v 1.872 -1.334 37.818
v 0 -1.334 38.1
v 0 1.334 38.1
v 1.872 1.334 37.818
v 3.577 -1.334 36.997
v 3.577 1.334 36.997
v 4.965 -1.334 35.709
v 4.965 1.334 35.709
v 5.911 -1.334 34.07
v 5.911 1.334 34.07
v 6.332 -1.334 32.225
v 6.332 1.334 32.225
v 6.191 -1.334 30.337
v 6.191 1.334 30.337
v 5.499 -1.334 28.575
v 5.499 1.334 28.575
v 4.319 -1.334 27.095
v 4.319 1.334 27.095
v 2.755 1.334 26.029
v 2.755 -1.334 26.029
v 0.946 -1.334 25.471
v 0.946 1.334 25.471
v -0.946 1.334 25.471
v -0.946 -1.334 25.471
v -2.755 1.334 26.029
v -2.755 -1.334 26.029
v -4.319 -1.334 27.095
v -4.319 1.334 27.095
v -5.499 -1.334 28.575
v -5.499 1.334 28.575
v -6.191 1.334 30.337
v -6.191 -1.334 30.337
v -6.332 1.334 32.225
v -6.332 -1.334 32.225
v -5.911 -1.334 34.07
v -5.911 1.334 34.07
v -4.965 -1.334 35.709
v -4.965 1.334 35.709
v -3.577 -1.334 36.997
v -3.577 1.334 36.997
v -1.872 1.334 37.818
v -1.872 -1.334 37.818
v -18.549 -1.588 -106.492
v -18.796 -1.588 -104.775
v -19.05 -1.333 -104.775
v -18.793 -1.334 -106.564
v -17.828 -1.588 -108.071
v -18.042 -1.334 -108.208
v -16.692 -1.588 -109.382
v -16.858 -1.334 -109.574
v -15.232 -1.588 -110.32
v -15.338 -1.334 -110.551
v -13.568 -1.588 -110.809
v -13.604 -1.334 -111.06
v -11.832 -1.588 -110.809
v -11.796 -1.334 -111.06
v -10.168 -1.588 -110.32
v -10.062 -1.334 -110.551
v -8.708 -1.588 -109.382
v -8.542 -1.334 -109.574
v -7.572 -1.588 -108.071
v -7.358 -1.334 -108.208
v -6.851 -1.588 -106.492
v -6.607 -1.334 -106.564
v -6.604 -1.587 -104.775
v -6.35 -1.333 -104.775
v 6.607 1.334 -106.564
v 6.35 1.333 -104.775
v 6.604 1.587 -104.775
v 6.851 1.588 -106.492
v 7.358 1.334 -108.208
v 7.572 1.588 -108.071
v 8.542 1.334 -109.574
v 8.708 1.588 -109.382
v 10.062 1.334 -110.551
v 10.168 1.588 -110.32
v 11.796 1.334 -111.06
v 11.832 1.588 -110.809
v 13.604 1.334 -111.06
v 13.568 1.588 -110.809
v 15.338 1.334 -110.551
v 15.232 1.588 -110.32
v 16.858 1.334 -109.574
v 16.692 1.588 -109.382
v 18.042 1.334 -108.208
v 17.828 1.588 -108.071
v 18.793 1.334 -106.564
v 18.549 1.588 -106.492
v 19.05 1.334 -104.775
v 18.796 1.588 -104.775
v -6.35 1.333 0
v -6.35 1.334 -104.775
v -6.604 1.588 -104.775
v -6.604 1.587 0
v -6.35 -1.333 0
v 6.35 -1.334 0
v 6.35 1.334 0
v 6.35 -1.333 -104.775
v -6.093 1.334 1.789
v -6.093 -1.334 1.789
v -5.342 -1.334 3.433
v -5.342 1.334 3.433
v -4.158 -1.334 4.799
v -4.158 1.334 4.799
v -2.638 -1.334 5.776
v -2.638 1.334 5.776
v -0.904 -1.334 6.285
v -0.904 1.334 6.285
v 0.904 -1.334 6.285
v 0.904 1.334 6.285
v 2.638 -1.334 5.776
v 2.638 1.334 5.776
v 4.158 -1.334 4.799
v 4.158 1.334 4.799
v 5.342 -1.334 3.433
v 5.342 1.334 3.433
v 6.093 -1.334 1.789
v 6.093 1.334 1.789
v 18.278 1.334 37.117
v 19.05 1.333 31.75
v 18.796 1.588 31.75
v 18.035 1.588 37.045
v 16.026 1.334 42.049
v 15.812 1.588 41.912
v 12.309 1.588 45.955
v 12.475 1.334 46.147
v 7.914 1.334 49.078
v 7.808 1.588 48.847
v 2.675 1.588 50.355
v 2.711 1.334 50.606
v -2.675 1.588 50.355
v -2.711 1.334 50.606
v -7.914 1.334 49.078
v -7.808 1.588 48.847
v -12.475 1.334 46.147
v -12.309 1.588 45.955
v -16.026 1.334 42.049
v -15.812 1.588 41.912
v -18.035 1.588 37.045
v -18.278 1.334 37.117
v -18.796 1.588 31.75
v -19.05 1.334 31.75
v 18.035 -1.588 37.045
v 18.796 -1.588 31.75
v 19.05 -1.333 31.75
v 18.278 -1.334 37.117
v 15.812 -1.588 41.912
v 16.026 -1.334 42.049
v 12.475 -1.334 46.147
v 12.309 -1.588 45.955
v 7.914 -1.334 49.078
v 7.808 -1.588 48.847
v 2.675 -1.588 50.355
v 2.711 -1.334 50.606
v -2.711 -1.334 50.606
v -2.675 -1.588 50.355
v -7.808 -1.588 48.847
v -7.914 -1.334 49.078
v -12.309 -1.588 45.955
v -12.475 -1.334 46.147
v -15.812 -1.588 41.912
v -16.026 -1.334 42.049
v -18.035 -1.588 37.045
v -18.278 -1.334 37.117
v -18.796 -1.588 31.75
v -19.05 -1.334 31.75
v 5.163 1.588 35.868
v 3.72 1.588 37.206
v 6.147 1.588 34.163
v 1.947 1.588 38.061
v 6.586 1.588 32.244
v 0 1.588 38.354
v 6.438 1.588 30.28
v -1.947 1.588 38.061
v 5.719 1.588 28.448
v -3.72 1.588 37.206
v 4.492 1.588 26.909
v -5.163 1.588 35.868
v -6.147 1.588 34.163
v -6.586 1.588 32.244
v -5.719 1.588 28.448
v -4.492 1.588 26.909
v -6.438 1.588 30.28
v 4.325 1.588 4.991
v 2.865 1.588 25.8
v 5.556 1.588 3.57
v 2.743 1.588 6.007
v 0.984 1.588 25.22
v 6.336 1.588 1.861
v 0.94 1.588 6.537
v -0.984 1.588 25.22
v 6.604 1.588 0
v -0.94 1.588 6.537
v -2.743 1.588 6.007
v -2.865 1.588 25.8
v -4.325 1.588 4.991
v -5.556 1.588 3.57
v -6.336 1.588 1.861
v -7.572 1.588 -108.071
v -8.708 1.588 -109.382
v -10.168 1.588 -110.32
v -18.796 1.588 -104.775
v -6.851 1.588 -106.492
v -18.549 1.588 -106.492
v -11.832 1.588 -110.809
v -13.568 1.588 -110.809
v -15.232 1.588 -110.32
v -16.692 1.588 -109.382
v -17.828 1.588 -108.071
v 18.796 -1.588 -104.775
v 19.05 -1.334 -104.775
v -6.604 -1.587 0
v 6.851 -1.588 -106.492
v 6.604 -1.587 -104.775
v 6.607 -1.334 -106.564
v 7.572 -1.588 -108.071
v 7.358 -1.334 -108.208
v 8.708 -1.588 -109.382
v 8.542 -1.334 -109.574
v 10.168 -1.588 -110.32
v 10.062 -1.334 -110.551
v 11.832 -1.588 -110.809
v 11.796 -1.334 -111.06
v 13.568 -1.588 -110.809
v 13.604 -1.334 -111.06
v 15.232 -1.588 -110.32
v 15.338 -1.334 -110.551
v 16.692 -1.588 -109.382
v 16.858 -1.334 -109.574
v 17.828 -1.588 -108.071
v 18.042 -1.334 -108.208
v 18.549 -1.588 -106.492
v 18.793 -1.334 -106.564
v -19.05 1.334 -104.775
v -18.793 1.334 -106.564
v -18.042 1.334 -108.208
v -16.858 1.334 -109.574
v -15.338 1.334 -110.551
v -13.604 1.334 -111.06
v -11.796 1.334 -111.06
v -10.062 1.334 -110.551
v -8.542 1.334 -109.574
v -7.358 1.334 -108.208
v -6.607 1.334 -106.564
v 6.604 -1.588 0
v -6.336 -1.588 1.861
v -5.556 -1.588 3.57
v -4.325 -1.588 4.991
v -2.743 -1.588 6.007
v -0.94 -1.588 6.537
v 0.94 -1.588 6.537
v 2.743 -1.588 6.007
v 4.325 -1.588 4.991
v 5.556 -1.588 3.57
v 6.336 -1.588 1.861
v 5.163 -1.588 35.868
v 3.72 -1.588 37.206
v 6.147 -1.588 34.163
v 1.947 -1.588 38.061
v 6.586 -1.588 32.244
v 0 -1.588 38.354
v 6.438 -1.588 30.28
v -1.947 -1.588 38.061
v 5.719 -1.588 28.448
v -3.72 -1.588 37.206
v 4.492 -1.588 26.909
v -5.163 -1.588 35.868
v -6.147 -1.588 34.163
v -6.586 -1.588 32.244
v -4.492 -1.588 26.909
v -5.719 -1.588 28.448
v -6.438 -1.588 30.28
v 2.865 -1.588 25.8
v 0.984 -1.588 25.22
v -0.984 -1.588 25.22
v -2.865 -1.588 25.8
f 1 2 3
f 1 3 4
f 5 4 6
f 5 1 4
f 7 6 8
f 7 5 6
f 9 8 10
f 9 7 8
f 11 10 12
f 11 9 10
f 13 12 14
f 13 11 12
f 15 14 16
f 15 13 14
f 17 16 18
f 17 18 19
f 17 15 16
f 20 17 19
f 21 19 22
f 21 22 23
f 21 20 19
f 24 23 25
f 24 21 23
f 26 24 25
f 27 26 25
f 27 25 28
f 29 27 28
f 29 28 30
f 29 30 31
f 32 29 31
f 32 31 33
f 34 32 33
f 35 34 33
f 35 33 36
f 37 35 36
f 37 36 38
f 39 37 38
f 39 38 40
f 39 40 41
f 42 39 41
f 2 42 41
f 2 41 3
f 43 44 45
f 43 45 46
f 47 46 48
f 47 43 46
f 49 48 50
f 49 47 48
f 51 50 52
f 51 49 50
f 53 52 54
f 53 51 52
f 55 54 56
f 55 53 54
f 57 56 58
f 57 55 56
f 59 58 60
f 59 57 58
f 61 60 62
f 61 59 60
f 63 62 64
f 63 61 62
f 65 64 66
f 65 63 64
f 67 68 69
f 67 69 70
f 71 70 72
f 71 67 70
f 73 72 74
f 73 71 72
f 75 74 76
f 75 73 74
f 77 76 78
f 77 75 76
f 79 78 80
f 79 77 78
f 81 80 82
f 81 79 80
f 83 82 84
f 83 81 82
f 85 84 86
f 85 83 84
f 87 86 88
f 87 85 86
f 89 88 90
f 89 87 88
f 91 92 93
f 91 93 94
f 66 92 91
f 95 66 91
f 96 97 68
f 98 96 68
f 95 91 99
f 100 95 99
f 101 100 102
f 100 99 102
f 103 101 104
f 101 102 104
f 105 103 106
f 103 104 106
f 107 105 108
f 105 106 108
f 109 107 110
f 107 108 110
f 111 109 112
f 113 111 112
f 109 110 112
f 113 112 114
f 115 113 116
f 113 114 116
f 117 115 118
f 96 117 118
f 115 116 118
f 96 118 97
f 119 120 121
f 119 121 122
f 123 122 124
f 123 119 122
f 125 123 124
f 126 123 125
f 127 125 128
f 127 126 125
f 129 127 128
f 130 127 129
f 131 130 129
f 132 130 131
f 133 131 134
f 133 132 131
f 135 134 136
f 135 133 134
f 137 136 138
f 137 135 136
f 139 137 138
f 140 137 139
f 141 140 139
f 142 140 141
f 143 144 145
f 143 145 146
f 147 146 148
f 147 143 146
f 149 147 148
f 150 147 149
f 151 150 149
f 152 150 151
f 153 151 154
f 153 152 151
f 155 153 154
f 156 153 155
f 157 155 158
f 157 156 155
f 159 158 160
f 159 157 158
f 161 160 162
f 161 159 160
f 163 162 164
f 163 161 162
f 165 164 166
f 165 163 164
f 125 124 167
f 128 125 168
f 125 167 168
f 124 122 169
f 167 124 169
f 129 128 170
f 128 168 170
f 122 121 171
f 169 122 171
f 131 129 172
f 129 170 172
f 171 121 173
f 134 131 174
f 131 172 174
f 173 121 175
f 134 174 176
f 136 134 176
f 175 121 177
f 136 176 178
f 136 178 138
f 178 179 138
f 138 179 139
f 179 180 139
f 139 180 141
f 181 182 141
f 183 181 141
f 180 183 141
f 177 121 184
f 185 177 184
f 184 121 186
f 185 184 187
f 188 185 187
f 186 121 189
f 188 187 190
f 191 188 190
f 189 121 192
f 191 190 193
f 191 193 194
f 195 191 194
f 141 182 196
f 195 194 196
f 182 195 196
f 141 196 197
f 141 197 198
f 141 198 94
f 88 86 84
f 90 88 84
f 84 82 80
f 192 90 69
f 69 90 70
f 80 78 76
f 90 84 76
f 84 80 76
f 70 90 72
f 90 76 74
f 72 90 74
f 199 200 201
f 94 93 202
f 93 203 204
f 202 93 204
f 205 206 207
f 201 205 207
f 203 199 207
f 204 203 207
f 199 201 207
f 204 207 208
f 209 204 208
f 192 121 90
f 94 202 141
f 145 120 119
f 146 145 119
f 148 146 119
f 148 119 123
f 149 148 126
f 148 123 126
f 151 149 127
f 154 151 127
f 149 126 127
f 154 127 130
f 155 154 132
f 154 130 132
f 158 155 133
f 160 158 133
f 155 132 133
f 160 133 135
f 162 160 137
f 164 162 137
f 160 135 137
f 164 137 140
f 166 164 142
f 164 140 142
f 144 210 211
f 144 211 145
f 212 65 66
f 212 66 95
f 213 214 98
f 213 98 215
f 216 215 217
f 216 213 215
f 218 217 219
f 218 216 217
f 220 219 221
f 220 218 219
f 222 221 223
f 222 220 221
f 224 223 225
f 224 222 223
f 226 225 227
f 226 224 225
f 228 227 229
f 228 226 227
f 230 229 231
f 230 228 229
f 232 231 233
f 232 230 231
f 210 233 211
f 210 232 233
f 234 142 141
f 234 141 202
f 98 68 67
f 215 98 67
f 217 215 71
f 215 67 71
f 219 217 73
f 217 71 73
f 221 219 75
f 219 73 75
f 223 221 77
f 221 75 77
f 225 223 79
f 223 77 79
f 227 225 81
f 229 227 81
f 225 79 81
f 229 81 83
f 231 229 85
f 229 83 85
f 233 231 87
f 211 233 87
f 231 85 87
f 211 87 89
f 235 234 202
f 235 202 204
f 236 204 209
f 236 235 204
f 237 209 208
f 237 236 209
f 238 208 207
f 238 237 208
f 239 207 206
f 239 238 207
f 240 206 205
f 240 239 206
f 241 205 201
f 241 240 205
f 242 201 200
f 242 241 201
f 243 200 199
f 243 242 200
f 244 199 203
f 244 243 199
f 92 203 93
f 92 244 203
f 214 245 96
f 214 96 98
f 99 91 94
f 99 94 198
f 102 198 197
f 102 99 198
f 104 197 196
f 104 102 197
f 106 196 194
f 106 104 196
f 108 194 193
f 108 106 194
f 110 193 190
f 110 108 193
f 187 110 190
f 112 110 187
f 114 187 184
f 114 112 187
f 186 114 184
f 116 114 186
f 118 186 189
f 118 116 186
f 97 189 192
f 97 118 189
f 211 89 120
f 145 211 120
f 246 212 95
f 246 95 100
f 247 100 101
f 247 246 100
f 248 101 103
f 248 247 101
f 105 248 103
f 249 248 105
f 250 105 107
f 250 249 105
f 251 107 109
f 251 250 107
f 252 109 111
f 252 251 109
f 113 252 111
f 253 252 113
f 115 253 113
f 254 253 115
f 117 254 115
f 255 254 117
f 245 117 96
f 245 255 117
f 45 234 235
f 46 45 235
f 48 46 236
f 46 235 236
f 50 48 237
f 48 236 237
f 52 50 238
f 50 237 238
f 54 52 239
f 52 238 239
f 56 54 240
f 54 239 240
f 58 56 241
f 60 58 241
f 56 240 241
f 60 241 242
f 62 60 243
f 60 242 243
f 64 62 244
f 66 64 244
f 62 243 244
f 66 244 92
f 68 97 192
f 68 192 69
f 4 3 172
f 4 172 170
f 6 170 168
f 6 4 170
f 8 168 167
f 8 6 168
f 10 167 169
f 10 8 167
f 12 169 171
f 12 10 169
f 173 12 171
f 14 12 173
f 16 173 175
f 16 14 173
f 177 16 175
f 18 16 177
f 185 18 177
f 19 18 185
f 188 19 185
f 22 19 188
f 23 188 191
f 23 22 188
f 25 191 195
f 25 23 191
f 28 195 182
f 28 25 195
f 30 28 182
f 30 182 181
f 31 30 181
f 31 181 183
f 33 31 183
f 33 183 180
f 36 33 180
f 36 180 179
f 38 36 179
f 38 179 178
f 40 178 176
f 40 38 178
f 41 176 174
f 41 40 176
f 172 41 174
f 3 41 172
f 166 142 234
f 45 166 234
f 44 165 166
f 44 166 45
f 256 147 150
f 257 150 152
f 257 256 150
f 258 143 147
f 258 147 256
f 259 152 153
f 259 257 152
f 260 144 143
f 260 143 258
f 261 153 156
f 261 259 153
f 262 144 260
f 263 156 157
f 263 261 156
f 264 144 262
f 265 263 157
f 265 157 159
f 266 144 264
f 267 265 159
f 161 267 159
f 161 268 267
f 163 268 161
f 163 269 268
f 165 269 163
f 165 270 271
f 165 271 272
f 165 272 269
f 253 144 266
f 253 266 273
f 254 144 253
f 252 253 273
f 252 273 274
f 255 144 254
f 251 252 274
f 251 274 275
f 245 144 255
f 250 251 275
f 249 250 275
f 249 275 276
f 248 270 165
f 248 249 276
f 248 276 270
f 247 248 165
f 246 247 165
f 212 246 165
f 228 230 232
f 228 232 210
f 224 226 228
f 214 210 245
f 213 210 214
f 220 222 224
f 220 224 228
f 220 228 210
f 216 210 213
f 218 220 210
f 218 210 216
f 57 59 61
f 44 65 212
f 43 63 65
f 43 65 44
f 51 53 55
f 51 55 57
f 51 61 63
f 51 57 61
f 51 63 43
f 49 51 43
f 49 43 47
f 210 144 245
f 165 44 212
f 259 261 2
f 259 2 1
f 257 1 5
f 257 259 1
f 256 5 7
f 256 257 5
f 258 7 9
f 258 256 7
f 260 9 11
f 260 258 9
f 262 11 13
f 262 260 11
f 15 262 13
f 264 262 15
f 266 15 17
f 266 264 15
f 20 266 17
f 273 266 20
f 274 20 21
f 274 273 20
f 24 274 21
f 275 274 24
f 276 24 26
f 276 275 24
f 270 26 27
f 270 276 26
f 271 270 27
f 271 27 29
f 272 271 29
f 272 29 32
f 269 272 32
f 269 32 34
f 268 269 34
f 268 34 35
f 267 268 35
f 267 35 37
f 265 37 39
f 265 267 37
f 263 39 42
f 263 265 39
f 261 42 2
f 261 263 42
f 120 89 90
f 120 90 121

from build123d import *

# Parameters (mm, degrees)
SKETCH1_R          = 6.35
BASE_EXTRUDE_DEPTH = 1.5875
CHAMFER1_SIZE      = 0.254


with BuildPart() as part:
    # Sketch1 → Base-Extrude (new body, symmetric)
    with BuildSketch(Plane(origin=(0, 0, 0), x_dir=(1, 0, 0), z_dir=(0, 1, 0))):
        with BuildLine():
            Line((6.35, 0), (6.35, 104.775))
            ThreePointArc((6.35, 104.775), (12.7, 111.125), (19.05, 104.775))
            Line((19.05, 104.775), (19.05, -31.75))
            ThreePointArc((19.05, -31.75), (0, -50.8), (-19.05, -31.75))
            Line((-19.05, -31.75), (-19.05, 104.775))
            ThreePointArc((-19.05, 104.775), (-12.7, 111.125), (-6.35, 104.775))
            Line((-6.35, 104.775), (-6.35, 0))
            ThreePointArc((-6.35, 0), (0, -6.35), (6.35, 0))
        make_face()
        with Locations(Location((0, -31.75, 0), (0, 0, 270))):  # turned: the seam where the file's is
            Circle(SKETCH1_R, mode=Mode.SUBTRACT)
    extrude(amount=BASE_EXTRUDE_DEPTH, both=True)

    # Chamfer1
    chamfer1_edges = [part.edges().sort_by_distance(p)[0] for p in [
        (-12.7, 1.5875, -111.125),
        (-6.35, -1.5875, -52.3875),
        (0, -1.5875, 6.35),
        (-19.05, 1.5875, -36.5125),
        (0, 1.5875, 50.8),
        (19.05, 1.5875, -36.5125),
        (0, -1.5875, 25.4),
        (0, 1.5875, 25.4),
        (12.7, 1.5875, -111.125),
        (6.35, 1.5875, -52.3875),
        (0, 1.5875, 6.35),
        (-6.35, 1.5875, -52.3875),
        (6.35, -1.5875, -52.3875),
        (12.7, -1.5875, -111.125),
        (19.05, -1.5875, -36.5125),
        (0, -1.5875, 50.8),
        (-19.05, -1.5875, -36.5125),
        (-12.7, -1.5875, -111.125),
    ]]
    chamfer(chamfer1_edges, length=CHAMFER1_SIZE)


solid = part.part
